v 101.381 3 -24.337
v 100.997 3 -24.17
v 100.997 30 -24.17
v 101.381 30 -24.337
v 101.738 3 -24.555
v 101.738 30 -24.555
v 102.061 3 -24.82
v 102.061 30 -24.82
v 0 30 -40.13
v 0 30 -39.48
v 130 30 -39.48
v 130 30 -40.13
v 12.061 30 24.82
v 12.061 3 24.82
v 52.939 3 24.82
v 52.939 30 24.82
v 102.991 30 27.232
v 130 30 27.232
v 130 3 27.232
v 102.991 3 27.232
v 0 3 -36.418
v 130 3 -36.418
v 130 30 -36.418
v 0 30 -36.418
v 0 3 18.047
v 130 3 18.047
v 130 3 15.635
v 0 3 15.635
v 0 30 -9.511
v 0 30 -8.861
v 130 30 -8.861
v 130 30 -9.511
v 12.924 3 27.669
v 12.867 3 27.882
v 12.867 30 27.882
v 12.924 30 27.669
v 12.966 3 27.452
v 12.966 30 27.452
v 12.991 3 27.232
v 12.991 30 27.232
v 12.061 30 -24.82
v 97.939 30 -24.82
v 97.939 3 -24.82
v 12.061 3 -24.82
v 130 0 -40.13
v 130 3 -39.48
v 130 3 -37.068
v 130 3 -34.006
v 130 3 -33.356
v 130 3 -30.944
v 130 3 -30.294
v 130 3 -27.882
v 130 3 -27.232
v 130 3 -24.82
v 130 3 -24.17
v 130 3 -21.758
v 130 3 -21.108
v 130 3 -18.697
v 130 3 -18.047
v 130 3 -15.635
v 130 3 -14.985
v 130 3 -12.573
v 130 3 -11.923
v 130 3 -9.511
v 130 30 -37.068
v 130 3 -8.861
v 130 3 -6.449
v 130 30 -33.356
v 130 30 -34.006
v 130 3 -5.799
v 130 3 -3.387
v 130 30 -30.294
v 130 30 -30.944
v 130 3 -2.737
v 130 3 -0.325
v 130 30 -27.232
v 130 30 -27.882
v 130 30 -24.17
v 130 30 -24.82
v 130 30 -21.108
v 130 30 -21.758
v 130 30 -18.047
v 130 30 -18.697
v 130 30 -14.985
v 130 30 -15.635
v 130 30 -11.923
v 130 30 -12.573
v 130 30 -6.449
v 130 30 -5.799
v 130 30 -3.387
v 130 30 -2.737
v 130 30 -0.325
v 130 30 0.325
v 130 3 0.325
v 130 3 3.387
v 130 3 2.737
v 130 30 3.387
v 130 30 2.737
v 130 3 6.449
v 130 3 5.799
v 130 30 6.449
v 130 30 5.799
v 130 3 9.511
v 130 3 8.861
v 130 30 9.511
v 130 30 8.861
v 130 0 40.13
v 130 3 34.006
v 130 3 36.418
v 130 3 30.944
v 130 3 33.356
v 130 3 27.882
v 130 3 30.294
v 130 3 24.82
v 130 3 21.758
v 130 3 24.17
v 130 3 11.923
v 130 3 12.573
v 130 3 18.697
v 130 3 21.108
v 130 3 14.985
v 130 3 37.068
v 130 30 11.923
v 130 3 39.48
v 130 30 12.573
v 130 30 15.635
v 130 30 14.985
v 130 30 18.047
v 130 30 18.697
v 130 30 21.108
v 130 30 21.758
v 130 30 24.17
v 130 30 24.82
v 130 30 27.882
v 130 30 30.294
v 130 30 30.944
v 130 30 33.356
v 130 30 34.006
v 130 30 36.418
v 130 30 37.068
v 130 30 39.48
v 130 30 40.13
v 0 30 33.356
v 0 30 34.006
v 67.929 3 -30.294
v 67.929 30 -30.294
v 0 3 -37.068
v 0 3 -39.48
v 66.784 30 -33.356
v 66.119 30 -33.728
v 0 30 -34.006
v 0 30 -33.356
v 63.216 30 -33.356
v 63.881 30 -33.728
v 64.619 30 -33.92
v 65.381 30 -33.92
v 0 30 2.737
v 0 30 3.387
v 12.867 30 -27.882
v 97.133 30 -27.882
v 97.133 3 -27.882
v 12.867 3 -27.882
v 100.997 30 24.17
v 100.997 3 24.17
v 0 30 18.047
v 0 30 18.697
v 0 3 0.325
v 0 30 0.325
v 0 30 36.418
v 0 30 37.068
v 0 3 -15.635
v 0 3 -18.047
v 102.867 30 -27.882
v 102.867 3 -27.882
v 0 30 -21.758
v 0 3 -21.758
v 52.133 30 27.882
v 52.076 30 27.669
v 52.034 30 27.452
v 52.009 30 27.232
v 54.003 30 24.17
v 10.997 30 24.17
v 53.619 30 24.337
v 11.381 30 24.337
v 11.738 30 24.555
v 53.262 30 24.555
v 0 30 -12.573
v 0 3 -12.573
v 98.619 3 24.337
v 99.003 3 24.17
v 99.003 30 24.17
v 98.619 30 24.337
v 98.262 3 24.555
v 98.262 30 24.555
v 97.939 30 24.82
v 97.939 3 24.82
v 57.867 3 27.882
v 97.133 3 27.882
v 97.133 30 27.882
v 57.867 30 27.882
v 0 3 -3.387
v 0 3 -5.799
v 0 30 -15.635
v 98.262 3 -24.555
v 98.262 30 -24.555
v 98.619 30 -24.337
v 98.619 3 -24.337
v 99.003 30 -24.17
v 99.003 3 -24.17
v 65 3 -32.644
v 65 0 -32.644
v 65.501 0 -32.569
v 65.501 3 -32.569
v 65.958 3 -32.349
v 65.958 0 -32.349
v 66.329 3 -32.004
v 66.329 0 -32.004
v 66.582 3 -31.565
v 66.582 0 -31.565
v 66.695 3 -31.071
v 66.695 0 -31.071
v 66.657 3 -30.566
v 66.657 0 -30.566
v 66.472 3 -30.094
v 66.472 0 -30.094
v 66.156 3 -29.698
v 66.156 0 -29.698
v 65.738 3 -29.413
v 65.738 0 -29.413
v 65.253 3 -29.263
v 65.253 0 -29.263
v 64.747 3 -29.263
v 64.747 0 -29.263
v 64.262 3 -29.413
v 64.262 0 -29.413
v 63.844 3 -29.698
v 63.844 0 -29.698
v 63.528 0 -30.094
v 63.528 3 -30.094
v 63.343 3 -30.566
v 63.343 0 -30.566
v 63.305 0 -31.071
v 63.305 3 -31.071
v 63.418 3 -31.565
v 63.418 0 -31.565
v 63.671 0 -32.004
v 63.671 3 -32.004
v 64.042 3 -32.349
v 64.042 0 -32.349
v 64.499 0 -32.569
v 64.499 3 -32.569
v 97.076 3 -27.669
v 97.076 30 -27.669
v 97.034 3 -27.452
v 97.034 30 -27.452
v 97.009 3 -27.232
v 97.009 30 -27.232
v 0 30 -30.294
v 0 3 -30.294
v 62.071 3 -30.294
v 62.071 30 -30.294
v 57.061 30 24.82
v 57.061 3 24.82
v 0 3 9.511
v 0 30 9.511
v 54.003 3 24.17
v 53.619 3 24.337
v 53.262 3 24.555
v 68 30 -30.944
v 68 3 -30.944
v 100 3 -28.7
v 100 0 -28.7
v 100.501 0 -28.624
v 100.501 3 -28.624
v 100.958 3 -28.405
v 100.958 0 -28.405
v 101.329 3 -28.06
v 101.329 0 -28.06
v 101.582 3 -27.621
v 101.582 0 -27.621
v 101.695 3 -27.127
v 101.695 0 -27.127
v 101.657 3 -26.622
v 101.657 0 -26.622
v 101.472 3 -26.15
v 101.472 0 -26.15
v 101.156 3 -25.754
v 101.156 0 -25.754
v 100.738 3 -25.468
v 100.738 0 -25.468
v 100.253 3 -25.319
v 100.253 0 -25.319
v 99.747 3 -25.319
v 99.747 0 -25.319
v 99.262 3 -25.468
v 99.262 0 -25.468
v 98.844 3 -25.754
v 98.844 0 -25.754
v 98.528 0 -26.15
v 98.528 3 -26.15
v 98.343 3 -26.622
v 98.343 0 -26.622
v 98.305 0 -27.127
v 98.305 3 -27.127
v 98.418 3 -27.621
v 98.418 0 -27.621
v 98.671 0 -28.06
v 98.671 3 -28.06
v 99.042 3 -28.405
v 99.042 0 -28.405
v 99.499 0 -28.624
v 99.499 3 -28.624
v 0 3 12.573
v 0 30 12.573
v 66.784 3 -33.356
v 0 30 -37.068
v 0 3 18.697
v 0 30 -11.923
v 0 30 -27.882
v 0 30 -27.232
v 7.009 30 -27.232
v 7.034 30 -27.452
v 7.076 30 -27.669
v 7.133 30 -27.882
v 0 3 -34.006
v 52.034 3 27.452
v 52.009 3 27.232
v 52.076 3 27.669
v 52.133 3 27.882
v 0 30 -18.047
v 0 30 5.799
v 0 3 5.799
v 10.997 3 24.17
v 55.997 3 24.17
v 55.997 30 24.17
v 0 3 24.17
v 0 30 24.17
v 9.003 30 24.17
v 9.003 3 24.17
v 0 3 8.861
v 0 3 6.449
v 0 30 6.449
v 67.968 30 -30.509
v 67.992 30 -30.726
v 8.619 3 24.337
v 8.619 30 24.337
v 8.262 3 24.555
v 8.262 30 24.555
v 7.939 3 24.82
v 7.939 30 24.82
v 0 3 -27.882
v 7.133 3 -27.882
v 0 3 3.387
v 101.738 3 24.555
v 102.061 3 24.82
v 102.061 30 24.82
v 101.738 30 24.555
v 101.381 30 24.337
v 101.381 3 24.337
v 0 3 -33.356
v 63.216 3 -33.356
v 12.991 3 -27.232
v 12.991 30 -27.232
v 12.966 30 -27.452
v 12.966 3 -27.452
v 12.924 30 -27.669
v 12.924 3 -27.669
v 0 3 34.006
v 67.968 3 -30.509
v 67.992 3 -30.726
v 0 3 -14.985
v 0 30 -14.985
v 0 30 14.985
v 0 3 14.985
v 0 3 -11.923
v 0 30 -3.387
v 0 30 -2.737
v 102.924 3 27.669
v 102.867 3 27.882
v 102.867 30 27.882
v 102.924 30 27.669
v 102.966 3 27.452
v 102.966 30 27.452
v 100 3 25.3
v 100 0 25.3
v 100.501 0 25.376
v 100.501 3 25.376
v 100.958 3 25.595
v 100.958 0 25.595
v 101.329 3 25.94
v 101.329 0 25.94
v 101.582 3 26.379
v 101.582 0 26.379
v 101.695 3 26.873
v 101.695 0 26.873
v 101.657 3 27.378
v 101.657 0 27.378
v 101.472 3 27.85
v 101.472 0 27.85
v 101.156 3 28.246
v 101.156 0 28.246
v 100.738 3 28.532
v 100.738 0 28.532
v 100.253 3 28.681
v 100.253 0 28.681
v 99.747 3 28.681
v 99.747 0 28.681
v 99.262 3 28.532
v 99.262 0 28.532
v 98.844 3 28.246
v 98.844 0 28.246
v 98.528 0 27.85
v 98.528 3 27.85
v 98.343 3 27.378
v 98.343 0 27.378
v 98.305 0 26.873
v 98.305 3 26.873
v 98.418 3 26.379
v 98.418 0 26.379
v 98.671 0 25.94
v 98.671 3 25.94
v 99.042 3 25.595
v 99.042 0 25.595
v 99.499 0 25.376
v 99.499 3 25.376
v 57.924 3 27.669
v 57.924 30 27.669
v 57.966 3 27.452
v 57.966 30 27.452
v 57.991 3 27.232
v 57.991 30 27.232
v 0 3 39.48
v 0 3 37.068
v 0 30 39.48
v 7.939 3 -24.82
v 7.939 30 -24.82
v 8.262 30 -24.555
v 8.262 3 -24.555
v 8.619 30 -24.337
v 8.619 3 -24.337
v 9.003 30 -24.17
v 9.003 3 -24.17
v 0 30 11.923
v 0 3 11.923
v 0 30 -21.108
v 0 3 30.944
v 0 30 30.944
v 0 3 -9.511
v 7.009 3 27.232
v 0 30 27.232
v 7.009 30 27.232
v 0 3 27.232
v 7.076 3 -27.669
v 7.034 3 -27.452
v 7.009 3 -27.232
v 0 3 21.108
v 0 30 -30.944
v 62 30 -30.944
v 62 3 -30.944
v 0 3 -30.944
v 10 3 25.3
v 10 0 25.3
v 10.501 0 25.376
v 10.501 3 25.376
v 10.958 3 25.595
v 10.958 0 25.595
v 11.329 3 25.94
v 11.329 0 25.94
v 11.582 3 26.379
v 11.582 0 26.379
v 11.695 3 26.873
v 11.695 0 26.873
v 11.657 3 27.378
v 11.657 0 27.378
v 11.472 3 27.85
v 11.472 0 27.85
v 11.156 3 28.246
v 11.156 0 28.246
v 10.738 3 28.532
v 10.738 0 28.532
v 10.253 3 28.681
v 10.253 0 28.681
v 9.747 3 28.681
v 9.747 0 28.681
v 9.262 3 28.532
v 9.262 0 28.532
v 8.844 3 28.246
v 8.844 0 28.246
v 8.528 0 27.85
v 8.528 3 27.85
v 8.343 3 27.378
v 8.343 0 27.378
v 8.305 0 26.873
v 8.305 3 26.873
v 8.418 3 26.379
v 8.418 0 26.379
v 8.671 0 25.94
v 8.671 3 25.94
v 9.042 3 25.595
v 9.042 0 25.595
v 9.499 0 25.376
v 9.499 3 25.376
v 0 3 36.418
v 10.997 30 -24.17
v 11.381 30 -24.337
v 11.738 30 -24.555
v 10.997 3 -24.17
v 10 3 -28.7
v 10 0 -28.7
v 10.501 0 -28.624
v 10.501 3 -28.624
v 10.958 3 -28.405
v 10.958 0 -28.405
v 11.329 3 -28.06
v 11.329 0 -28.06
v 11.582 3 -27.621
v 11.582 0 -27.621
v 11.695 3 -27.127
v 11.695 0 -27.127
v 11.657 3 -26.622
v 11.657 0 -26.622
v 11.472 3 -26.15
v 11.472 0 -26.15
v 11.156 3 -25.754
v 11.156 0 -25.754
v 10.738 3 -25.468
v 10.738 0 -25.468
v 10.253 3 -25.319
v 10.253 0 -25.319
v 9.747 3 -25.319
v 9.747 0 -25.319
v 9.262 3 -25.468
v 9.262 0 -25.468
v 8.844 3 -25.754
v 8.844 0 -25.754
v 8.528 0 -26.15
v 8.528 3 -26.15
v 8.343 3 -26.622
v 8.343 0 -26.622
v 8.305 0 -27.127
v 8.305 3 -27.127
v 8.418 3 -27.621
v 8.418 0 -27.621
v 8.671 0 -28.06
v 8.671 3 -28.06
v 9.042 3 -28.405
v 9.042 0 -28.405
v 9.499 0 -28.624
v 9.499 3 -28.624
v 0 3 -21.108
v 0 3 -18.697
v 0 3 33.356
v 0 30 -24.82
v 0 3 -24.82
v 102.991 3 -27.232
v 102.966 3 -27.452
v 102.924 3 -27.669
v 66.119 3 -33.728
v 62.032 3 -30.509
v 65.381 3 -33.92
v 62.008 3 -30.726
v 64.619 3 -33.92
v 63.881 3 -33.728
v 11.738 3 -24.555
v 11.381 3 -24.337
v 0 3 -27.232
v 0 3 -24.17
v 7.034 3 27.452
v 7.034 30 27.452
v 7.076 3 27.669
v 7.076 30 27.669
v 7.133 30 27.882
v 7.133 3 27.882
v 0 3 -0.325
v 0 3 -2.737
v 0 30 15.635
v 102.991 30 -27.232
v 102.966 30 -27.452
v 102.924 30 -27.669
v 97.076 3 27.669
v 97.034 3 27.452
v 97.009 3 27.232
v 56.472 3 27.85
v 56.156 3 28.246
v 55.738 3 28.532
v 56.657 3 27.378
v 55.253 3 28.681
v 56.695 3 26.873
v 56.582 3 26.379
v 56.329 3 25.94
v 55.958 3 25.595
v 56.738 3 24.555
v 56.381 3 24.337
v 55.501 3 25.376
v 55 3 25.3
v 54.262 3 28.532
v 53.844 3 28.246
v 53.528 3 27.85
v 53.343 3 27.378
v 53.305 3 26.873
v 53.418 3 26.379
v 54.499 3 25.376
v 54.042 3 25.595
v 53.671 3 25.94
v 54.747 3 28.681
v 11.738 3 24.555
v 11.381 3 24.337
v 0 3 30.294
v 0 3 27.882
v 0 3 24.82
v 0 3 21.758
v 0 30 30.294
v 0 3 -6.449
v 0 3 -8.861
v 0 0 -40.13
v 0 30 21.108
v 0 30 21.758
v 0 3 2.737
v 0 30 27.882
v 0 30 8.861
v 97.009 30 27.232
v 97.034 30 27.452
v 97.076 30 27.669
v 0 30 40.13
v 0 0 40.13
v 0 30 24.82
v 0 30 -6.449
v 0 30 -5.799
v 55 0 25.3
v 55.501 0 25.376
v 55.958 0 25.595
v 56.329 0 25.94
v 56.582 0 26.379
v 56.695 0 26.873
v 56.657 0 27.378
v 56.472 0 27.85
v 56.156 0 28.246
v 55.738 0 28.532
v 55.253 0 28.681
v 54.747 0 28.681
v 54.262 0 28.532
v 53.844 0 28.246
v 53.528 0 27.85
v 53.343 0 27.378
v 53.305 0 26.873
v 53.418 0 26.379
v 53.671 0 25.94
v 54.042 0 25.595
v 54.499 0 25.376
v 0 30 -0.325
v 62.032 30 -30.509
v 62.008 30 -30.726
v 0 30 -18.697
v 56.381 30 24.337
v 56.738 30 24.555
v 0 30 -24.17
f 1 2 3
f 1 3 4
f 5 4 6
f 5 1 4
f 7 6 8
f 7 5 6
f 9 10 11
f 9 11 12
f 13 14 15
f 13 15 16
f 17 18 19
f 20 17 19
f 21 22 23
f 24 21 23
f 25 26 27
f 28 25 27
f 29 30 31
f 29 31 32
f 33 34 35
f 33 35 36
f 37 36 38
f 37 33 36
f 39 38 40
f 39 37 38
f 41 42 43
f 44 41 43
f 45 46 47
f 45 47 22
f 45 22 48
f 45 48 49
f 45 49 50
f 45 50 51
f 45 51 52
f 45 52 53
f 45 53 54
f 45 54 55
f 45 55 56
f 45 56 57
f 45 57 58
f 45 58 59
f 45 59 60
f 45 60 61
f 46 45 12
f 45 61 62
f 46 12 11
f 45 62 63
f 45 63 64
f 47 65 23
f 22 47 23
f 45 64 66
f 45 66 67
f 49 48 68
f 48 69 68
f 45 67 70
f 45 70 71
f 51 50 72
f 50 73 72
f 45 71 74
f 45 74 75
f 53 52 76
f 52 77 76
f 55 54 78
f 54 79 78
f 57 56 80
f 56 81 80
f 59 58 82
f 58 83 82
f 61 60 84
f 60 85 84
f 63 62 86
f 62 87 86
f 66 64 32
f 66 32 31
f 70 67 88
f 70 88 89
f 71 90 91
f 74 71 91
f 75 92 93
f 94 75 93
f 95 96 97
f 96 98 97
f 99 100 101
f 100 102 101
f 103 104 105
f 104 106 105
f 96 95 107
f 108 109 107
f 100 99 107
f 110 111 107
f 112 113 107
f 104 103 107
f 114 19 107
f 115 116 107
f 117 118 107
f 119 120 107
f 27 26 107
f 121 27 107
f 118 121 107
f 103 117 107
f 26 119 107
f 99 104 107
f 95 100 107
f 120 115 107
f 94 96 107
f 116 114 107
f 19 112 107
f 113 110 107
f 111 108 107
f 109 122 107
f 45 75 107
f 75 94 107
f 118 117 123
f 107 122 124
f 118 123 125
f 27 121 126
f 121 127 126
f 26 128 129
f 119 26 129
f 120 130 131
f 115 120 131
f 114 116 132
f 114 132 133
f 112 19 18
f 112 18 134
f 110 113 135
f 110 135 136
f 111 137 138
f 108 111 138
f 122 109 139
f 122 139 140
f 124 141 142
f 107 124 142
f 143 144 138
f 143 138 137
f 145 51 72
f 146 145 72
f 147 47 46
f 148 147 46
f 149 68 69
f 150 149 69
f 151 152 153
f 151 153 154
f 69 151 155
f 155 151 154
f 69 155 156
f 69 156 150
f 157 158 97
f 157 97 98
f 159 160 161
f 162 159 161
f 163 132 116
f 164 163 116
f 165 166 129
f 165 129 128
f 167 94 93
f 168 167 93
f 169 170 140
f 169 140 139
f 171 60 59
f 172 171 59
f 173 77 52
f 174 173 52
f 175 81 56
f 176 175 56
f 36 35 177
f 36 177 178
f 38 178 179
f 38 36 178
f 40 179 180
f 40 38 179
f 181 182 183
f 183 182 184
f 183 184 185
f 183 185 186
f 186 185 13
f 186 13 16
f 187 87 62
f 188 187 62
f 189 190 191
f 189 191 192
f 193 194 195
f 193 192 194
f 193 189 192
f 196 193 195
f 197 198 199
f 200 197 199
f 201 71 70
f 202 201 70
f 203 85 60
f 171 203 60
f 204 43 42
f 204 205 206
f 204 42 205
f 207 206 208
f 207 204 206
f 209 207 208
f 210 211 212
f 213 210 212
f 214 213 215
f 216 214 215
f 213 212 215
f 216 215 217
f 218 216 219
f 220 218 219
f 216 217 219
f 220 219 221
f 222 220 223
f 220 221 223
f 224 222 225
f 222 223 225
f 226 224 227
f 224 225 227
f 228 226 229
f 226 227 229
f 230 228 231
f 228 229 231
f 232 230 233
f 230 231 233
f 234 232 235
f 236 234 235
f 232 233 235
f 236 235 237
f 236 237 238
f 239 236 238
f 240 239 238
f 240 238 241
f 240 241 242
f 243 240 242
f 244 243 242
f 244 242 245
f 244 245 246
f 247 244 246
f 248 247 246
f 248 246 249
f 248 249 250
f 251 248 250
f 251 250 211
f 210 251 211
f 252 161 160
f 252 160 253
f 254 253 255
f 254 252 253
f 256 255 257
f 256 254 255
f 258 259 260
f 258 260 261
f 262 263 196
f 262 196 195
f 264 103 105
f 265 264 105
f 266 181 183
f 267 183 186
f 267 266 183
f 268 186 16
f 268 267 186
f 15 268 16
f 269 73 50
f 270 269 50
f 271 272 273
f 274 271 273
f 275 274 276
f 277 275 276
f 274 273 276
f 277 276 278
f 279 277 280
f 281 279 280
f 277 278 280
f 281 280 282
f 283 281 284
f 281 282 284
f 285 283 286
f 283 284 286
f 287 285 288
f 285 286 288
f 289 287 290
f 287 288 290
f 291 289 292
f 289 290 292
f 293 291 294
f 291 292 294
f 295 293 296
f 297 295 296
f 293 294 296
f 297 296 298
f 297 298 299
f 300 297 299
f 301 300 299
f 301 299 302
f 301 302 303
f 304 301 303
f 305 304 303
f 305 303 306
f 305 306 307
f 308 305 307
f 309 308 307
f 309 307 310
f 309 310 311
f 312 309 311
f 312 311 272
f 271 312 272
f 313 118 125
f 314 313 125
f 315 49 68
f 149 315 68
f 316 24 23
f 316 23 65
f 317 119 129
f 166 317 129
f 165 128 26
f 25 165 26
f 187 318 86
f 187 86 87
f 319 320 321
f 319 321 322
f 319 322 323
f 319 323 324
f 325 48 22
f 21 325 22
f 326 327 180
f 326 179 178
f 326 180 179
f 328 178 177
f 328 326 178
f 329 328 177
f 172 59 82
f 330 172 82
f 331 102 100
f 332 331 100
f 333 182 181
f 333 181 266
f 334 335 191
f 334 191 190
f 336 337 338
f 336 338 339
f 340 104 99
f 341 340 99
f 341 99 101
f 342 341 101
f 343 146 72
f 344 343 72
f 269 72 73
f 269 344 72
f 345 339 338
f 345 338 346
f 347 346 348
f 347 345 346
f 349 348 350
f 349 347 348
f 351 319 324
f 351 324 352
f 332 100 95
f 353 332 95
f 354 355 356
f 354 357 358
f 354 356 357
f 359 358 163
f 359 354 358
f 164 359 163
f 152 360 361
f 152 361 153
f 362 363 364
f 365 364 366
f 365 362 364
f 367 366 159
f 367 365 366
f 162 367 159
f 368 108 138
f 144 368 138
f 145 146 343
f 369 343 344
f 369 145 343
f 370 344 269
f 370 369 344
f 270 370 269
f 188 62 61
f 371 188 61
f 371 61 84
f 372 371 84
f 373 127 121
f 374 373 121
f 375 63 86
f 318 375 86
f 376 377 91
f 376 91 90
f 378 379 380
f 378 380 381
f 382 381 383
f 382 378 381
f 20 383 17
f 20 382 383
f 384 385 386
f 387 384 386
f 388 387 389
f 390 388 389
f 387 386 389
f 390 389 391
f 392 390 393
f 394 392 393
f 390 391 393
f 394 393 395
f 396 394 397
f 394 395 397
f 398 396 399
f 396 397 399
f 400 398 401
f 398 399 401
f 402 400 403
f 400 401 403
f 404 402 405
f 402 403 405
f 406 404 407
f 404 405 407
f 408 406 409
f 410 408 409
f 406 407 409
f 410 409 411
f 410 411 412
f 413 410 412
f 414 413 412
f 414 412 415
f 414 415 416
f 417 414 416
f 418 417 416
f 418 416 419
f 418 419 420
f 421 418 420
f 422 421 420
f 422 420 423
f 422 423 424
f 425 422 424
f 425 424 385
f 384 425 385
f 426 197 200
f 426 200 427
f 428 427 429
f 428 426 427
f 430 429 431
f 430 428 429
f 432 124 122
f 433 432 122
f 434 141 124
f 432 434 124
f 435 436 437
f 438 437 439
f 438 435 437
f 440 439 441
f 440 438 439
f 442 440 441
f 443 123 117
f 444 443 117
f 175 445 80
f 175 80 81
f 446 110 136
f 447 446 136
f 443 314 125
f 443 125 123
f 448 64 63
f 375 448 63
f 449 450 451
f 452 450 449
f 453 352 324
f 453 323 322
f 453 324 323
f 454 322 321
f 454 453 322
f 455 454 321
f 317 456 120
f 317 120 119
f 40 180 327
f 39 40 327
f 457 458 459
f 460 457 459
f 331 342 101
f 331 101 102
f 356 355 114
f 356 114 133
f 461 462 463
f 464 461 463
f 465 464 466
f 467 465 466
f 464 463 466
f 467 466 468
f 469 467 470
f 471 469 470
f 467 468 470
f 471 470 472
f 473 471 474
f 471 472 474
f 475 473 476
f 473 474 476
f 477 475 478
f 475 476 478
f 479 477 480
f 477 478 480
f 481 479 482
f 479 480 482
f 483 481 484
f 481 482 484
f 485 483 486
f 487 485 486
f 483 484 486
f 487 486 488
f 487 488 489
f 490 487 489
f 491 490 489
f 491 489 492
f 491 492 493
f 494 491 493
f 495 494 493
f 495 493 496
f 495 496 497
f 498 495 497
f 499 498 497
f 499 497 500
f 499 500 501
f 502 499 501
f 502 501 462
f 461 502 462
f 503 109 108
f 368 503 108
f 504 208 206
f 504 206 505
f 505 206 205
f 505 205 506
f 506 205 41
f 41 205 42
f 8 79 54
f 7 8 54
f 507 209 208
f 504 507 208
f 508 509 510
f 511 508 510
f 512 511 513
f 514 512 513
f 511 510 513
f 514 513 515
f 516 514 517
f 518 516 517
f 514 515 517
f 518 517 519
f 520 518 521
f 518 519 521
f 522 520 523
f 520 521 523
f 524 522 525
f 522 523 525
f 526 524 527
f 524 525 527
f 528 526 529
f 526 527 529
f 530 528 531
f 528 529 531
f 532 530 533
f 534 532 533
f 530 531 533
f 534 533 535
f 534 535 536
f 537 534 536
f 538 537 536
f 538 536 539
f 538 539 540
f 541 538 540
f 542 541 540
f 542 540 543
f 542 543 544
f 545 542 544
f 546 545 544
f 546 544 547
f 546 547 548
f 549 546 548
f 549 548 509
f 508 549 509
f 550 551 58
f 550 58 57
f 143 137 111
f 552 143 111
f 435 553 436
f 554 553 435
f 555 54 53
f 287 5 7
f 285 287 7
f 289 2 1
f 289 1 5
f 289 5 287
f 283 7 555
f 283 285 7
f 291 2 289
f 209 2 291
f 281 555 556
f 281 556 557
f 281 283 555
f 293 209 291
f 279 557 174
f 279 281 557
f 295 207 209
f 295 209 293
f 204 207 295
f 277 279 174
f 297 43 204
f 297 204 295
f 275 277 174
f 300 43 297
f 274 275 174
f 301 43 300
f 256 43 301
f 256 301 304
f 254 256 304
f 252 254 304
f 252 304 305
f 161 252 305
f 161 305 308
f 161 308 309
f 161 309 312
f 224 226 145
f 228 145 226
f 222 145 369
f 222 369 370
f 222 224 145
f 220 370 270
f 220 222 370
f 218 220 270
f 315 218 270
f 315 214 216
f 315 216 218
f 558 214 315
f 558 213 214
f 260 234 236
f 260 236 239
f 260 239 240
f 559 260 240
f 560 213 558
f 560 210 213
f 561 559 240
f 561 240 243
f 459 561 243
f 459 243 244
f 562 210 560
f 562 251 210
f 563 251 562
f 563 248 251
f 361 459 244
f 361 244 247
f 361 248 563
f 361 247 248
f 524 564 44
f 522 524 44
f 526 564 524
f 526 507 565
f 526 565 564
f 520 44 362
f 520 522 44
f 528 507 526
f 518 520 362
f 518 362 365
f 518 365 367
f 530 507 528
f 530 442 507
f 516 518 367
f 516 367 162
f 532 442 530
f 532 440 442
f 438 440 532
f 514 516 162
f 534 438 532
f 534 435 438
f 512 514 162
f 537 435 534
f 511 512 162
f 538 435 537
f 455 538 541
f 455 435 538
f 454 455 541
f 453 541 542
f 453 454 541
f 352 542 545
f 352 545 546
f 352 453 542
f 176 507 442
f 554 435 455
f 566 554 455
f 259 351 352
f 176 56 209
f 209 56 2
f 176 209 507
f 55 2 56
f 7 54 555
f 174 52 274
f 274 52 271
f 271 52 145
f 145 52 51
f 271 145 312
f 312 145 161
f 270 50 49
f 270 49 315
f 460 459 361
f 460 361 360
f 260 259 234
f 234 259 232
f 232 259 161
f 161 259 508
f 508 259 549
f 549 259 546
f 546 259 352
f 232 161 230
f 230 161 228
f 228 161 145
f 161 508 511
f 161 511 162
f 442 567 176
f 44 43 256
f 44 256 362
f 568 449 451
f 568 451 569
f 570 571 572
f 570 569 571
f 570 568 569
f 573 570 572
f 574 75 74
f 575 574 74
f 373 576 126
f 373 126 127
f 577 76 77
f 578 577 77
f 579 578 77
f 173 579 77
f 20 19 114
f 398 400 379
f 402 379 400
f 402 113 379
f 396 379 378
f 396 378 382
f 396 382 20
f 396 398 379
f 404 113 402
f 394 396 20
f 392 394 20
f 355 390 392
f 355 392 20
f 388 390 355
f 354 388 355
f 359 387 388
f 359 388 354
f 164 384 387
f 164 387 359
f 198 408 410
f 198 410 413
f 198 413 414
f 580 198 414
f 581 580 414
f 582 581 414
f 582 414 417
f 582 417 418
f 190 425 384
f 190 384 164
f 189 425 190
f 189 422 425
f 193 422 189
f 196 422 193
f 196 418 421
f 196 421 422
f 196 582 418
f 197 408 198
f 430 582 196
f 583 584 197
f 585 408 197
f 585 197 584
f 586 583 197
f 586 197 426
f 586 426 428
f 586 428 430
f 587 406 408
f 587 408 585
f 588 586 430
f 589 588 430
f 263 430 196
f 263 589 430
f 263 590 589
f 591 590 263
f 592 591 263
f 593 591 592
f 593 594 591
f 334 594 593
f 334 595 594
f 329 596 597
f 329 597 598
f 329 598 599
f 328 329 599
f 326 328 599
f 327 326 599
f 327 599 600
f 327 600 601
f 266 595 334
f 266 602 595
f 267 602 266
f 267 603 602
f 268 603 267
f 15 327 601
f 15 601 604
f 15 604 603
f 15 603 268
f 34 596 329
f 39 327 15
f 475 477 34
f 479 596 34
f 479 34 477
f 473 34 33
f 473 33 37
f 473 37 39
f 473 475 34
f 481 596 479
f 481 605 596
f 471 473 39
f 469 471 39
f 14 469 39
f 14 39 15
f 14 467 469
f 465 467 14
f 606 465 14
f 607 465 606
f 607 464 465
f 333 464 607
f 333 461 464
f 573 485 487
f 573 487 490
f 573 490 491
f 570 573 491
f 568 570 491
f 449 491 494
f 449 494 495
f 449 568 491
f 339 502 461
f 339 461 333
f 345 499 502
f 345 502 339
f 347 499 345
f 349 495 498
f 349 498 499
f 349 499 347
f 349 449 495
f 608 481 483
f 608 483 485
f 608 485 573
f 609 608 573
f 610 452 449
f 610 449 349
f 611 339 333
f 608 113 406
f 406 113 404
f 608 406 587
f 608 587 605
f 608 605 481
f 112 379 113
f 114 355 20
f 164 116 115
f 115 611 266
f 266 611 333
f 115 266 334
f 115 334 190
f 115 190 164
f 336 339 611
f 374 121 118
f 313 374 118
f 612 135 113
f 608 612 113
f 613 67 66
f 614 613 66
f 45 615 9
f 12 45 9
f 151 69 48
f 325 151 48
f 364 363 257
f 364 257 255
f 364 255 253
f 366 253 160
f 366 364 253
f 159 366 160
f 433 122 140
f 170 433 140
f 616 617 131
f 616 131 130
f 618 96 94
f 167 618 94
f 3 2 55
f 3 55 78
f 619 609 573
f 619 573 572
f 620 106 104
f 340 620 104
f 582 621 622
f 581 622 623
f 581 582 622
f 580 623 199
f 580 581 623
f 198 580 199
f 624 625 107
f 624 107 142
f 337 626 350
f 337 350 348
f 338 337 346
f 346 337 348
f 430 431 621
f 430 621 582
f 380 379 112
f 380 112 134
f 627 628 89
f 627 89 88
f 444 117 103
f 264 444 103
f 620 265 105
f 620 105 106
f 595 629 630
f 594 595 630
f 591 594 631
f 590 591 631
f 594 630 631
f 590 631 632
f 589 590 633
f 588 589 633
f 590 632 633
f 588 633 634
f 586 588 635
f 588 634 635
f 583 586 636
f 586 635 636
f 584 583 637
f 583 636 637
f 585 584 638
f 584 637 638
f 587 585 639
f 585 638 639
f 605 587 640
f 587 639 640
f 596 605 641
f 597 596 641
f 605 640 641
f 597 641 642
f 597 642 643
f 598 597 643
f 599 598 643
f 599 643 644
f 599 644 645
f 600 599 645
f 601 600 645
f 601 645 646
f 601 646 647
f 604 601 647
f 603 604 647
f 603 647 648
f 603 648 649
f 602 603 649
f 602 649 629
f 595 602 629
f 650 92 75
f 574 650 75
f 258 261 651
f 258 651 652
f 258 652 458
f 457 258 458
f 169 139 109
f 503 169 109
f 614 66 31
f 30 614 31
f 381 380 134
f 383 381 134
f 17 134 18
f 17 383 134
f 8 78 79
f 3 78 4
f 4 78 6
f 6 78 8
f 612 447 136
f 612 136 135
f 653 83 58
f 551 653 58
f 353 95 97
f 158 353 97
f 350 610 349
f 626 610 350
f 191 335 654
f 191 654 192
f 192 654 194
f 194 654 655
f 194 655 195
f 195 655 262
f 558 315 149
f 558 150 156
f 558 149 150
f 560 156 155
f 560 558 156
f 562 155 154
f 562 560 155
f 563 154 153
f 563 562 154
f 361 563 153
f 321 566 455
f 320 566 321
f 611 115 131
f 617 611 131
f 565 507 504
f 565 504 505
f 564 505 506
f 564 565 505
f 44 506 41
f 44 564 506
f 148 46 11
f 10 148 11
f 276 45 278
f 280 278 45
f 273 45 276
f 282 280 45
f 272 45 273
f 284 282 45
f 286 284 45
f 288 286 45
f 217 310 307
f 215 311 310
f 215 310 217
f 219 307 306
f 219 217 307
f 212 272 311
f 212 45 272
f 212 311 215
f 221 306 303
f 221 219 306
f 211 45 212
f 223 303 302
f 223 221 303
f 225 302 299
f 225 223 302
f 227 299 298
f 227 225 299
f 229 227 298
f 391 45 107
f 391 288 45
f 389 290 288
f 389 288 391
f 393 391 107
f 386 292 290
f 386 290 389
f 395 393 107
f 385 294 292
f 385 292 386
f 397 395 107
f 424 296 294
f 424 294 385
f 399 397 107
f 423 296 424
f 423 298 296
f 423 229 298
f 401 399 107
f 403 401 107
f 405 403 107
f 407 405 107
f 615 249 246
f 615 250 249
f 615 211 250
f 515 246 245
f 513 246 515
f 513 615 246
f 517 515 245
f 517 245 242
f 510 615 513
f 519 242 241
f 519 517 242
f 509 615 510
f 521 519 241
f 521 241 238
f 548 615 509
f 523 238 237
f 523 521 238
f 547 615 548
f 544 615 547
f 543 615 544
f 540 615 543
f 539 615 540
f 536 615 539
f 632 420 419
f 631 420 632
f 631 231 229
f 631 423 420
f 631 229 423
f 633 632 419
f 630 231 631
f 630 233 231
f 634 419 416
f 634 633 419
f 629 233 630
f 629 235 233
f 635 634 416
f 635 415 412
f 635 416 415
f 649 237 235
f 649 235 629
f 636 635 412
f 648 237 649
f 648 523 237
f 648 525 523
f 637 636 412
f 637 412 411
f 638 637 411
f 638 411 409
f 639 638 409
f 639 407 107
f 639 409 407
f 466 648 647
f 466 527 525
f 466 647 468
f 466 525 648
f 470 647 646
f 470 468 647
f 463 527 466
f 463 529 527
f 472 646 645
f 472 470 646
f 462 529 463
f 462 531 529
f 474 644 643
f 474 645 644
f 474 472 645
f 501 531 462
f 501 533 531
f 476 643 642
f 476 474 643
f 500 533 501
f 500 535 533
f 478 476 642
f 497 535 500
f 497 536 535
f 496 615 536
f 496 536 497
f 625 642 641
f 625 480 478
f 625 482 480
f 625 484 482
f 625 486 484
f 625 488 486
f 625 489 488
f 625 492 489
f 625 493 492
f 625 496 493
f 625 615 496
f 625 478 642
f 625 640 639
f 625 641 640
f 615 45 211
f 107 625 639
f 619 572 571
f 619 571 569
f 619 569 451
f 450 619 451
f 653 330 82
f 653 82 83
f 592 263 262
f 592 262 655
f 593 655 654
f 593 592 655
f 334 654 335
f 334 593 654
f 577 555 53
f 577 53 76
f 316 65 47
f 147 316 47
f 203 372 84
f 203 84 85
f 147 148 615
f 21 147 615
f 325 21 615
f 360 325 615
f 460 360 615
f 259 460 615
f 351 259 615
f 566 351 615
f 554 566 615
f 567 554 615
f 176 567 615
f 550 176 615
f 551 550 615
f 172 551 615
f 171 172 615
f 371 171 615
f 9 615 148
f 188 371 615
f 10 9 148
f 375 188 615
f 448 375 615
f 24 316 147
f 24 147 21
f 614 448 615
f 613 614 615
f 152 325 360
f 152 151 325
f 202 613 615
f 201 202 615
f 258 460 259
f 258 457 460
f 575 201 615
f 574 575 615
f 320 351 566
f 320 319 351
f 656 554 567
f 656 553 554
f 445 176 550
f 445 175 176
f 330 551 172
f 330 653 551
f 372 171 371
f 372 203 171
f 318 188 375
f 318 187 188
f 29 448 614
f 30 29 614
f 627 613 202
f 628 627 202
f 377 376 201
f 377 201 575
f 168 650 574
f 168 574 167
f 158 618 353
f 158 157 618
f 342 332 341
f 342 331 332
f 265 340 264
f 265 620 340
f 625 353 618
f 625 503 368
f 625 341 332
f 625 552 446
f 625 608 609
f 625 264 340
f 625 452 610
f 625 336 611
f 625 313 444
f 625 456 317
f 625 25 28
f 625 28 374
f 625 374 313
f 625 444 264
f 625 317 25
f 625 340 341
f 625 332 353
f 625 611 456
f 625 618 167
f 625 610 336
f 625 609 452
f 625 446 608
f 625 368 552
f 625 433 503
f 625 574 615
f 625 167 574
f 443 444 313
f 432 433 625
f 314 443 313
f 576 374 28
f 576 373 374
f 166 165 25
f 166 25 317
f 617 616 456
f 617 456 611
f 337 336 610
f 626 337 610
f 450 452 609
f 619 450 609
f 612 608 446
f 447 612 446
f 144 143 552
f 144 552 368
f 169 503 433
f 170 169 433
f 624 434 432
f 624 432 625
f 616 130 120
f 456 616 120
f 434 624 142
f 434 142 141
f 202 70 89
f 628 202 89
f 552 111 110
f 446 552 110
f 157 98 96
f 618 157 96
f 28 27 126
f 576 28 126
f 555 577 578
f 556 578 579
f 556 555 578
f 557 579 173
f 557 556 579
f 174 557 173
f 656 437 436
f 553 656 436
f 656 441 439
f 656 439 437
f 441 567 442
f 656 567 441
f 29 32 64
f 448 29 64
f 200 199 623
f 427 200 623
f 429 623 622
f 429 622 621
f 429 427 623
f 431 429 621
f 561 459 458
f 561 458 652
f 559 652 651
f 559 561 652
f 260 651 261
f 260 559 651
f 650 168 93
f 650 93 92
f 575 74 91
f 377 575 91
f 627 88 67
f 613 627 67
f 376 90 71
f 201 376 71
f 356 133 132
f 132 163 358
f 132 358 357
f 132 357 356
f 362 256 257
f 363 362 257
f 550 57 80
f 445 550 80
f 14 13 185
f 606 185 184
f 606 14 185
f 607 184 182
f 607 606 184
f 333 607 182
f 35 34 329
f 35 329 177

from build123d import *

# Parameters (mm, degrees)
BOSS_EXTRUDE1_DEPTH  = 130
SKETCH2_R            = 3
CUT_EXTRUDE1_DEPTH   = 139.706225167
M3_CLEARANCE_HOLE1_D = 3.4


with BuildPart() as part:
    # Sketch1 → Boss-Extrude1 (new body)
    with BuildSketch(Plane(origin=(0, 0, 0), x_dir=(0, 0, -1), z_dir=(1, 0, 0))):
        Polygon((-40.13, 0), (-40.13, 30), (-39.48, 30), (-39.48, 3), (-37.068076923, 3), (-37.068076923, 30), (-36.418076923, 30), (-36.418076923, 3), (-34.006153846, 3), (-34.006153846, 30), (-33.356153846, 30), (-33.356153846, 3), (-30.944230769, 3), (-30.944230769, 30), (-30.294230769, 30), (-30.294230769, 3), (-27.882307692, 3), (-27.882307692, 30), (-27.232307692, 30), (-27.232307692, 3), (-24.820384615, 3), (-24.820384615, 30), (-24.170384615, 30), (-24.170384615, 3), (-21.758461538, 3), (-21.758461538, 30), (-21.108461538, 30), (-21.108461538, 3), (-18.696538462, 3), (-18.696538462, 30), (-18.046538462, 30), (-18.046538462, 3), (-15.634615385, 3), (-15.634615385, 30), (-14.984615385, 30), (-14.984615385, 3), (-12.572692308, 3), (-12.572692308, 30), (-11.922692308, 30), (-11.922692308, 3), (-9.510769231, 3), (-9.510769231, 30), (-8.860769231, 30), (-8.860769231, 3), (-6.448846154, 3), (-6.448846154, 30), (-5.798846154, 30), (-5.798846154, 3), (-3.386923077, 3), (-3.386923077, 30), (-2.736923077, 30), (-2.736923077, 3), (-0.325, 3), (-0.325, 30), (0.325, 30), (0.325, 3), (2.736923077, 3), (2.736923077, 30), (3.386923077, 30), (3.386923077, 3), (5.798846154, 3), (5.798846154, 30), (6.448846154, 30), (6.448846154, 3), (8.860769231, 3), (8.860769231, 30), (9.510769231, 30), (9.510769231, 3), (11.922692308, 3), (11.922692308, 30), (12.572692308, 30), (12.572692308, 3), (14.984615385, 3), (14.984615385, 30), (15.634615385, 30), (15.634615385, 3), (18.046538462, 3), (18.046538462, 30), (18.696538462, 30), (18.696538462, 3), (21.108461538, 3), (21.108461538, 30), (21.758461538, 30), (21.758461538, 3), (24.170384615, 3), (24.170384615, 30), (24.820384615, 30), (24.820384615, 3), (27.232307692, 3), (27.232307692, 30), (27.882307692, 30), (27.882307692, 3), (30.294230769, 3), (30.294230769, 30), (30.944230769, 30), (30.944230769, 3), (33.356153846, 3), (33.356153846, 30), (34.006153846, 30), (34.006153846, 3), (36.418076923, 3), (36.418076923, 30), (37.068076923, 30), (37.068076923, 3), (39.48, 3), (39.48, 30), (40.13, 30), (40.13, 3), (40.13, 0), align=None)
    extrude(amount=BOSS_EXTRUDE1_DEPTH)

    # Sketch2 → Cut-Extrude1 (cut, through all)
    with BuildSketch(Plane(origin=(0, 3, 0), x_dir=(1, 0, 0), z_dir=(0, 1, 0))):
        with Locations((10, 27)):
            Circle(SKETCH2_R)
        with Locations((100, 27)):
            Circle(SKETCH2_R)
        with Locations((65, 30.944230769)):
            Circle(SKETCH2_R)
        with Locations((10, -27)):
            Circle(SKETCH2_R)
        with Locations((55, -27)):
            Circle(SKETCH2_R)
        with Locations((100, -27)):
            Circle(SKETCH2_R)
    extrude(amount=CUT_EXTRUDE1_DEPTH, mode=Mode.SUBTRACT)

    # M3 Clearance Hole1 (through all)
    with Locations(Plane(origin=(10, 3, -27), x_dir=(0, 0, 1), z_dir=(0, 1, 0))):
        with Locations((0, 0), (-3.944230769, 55), (0, 90), (54, 0), (54, 45), (54, 90)):
            Hole(M3_CLEARANCE_HOLE1_D / 2)


solid = part.part
